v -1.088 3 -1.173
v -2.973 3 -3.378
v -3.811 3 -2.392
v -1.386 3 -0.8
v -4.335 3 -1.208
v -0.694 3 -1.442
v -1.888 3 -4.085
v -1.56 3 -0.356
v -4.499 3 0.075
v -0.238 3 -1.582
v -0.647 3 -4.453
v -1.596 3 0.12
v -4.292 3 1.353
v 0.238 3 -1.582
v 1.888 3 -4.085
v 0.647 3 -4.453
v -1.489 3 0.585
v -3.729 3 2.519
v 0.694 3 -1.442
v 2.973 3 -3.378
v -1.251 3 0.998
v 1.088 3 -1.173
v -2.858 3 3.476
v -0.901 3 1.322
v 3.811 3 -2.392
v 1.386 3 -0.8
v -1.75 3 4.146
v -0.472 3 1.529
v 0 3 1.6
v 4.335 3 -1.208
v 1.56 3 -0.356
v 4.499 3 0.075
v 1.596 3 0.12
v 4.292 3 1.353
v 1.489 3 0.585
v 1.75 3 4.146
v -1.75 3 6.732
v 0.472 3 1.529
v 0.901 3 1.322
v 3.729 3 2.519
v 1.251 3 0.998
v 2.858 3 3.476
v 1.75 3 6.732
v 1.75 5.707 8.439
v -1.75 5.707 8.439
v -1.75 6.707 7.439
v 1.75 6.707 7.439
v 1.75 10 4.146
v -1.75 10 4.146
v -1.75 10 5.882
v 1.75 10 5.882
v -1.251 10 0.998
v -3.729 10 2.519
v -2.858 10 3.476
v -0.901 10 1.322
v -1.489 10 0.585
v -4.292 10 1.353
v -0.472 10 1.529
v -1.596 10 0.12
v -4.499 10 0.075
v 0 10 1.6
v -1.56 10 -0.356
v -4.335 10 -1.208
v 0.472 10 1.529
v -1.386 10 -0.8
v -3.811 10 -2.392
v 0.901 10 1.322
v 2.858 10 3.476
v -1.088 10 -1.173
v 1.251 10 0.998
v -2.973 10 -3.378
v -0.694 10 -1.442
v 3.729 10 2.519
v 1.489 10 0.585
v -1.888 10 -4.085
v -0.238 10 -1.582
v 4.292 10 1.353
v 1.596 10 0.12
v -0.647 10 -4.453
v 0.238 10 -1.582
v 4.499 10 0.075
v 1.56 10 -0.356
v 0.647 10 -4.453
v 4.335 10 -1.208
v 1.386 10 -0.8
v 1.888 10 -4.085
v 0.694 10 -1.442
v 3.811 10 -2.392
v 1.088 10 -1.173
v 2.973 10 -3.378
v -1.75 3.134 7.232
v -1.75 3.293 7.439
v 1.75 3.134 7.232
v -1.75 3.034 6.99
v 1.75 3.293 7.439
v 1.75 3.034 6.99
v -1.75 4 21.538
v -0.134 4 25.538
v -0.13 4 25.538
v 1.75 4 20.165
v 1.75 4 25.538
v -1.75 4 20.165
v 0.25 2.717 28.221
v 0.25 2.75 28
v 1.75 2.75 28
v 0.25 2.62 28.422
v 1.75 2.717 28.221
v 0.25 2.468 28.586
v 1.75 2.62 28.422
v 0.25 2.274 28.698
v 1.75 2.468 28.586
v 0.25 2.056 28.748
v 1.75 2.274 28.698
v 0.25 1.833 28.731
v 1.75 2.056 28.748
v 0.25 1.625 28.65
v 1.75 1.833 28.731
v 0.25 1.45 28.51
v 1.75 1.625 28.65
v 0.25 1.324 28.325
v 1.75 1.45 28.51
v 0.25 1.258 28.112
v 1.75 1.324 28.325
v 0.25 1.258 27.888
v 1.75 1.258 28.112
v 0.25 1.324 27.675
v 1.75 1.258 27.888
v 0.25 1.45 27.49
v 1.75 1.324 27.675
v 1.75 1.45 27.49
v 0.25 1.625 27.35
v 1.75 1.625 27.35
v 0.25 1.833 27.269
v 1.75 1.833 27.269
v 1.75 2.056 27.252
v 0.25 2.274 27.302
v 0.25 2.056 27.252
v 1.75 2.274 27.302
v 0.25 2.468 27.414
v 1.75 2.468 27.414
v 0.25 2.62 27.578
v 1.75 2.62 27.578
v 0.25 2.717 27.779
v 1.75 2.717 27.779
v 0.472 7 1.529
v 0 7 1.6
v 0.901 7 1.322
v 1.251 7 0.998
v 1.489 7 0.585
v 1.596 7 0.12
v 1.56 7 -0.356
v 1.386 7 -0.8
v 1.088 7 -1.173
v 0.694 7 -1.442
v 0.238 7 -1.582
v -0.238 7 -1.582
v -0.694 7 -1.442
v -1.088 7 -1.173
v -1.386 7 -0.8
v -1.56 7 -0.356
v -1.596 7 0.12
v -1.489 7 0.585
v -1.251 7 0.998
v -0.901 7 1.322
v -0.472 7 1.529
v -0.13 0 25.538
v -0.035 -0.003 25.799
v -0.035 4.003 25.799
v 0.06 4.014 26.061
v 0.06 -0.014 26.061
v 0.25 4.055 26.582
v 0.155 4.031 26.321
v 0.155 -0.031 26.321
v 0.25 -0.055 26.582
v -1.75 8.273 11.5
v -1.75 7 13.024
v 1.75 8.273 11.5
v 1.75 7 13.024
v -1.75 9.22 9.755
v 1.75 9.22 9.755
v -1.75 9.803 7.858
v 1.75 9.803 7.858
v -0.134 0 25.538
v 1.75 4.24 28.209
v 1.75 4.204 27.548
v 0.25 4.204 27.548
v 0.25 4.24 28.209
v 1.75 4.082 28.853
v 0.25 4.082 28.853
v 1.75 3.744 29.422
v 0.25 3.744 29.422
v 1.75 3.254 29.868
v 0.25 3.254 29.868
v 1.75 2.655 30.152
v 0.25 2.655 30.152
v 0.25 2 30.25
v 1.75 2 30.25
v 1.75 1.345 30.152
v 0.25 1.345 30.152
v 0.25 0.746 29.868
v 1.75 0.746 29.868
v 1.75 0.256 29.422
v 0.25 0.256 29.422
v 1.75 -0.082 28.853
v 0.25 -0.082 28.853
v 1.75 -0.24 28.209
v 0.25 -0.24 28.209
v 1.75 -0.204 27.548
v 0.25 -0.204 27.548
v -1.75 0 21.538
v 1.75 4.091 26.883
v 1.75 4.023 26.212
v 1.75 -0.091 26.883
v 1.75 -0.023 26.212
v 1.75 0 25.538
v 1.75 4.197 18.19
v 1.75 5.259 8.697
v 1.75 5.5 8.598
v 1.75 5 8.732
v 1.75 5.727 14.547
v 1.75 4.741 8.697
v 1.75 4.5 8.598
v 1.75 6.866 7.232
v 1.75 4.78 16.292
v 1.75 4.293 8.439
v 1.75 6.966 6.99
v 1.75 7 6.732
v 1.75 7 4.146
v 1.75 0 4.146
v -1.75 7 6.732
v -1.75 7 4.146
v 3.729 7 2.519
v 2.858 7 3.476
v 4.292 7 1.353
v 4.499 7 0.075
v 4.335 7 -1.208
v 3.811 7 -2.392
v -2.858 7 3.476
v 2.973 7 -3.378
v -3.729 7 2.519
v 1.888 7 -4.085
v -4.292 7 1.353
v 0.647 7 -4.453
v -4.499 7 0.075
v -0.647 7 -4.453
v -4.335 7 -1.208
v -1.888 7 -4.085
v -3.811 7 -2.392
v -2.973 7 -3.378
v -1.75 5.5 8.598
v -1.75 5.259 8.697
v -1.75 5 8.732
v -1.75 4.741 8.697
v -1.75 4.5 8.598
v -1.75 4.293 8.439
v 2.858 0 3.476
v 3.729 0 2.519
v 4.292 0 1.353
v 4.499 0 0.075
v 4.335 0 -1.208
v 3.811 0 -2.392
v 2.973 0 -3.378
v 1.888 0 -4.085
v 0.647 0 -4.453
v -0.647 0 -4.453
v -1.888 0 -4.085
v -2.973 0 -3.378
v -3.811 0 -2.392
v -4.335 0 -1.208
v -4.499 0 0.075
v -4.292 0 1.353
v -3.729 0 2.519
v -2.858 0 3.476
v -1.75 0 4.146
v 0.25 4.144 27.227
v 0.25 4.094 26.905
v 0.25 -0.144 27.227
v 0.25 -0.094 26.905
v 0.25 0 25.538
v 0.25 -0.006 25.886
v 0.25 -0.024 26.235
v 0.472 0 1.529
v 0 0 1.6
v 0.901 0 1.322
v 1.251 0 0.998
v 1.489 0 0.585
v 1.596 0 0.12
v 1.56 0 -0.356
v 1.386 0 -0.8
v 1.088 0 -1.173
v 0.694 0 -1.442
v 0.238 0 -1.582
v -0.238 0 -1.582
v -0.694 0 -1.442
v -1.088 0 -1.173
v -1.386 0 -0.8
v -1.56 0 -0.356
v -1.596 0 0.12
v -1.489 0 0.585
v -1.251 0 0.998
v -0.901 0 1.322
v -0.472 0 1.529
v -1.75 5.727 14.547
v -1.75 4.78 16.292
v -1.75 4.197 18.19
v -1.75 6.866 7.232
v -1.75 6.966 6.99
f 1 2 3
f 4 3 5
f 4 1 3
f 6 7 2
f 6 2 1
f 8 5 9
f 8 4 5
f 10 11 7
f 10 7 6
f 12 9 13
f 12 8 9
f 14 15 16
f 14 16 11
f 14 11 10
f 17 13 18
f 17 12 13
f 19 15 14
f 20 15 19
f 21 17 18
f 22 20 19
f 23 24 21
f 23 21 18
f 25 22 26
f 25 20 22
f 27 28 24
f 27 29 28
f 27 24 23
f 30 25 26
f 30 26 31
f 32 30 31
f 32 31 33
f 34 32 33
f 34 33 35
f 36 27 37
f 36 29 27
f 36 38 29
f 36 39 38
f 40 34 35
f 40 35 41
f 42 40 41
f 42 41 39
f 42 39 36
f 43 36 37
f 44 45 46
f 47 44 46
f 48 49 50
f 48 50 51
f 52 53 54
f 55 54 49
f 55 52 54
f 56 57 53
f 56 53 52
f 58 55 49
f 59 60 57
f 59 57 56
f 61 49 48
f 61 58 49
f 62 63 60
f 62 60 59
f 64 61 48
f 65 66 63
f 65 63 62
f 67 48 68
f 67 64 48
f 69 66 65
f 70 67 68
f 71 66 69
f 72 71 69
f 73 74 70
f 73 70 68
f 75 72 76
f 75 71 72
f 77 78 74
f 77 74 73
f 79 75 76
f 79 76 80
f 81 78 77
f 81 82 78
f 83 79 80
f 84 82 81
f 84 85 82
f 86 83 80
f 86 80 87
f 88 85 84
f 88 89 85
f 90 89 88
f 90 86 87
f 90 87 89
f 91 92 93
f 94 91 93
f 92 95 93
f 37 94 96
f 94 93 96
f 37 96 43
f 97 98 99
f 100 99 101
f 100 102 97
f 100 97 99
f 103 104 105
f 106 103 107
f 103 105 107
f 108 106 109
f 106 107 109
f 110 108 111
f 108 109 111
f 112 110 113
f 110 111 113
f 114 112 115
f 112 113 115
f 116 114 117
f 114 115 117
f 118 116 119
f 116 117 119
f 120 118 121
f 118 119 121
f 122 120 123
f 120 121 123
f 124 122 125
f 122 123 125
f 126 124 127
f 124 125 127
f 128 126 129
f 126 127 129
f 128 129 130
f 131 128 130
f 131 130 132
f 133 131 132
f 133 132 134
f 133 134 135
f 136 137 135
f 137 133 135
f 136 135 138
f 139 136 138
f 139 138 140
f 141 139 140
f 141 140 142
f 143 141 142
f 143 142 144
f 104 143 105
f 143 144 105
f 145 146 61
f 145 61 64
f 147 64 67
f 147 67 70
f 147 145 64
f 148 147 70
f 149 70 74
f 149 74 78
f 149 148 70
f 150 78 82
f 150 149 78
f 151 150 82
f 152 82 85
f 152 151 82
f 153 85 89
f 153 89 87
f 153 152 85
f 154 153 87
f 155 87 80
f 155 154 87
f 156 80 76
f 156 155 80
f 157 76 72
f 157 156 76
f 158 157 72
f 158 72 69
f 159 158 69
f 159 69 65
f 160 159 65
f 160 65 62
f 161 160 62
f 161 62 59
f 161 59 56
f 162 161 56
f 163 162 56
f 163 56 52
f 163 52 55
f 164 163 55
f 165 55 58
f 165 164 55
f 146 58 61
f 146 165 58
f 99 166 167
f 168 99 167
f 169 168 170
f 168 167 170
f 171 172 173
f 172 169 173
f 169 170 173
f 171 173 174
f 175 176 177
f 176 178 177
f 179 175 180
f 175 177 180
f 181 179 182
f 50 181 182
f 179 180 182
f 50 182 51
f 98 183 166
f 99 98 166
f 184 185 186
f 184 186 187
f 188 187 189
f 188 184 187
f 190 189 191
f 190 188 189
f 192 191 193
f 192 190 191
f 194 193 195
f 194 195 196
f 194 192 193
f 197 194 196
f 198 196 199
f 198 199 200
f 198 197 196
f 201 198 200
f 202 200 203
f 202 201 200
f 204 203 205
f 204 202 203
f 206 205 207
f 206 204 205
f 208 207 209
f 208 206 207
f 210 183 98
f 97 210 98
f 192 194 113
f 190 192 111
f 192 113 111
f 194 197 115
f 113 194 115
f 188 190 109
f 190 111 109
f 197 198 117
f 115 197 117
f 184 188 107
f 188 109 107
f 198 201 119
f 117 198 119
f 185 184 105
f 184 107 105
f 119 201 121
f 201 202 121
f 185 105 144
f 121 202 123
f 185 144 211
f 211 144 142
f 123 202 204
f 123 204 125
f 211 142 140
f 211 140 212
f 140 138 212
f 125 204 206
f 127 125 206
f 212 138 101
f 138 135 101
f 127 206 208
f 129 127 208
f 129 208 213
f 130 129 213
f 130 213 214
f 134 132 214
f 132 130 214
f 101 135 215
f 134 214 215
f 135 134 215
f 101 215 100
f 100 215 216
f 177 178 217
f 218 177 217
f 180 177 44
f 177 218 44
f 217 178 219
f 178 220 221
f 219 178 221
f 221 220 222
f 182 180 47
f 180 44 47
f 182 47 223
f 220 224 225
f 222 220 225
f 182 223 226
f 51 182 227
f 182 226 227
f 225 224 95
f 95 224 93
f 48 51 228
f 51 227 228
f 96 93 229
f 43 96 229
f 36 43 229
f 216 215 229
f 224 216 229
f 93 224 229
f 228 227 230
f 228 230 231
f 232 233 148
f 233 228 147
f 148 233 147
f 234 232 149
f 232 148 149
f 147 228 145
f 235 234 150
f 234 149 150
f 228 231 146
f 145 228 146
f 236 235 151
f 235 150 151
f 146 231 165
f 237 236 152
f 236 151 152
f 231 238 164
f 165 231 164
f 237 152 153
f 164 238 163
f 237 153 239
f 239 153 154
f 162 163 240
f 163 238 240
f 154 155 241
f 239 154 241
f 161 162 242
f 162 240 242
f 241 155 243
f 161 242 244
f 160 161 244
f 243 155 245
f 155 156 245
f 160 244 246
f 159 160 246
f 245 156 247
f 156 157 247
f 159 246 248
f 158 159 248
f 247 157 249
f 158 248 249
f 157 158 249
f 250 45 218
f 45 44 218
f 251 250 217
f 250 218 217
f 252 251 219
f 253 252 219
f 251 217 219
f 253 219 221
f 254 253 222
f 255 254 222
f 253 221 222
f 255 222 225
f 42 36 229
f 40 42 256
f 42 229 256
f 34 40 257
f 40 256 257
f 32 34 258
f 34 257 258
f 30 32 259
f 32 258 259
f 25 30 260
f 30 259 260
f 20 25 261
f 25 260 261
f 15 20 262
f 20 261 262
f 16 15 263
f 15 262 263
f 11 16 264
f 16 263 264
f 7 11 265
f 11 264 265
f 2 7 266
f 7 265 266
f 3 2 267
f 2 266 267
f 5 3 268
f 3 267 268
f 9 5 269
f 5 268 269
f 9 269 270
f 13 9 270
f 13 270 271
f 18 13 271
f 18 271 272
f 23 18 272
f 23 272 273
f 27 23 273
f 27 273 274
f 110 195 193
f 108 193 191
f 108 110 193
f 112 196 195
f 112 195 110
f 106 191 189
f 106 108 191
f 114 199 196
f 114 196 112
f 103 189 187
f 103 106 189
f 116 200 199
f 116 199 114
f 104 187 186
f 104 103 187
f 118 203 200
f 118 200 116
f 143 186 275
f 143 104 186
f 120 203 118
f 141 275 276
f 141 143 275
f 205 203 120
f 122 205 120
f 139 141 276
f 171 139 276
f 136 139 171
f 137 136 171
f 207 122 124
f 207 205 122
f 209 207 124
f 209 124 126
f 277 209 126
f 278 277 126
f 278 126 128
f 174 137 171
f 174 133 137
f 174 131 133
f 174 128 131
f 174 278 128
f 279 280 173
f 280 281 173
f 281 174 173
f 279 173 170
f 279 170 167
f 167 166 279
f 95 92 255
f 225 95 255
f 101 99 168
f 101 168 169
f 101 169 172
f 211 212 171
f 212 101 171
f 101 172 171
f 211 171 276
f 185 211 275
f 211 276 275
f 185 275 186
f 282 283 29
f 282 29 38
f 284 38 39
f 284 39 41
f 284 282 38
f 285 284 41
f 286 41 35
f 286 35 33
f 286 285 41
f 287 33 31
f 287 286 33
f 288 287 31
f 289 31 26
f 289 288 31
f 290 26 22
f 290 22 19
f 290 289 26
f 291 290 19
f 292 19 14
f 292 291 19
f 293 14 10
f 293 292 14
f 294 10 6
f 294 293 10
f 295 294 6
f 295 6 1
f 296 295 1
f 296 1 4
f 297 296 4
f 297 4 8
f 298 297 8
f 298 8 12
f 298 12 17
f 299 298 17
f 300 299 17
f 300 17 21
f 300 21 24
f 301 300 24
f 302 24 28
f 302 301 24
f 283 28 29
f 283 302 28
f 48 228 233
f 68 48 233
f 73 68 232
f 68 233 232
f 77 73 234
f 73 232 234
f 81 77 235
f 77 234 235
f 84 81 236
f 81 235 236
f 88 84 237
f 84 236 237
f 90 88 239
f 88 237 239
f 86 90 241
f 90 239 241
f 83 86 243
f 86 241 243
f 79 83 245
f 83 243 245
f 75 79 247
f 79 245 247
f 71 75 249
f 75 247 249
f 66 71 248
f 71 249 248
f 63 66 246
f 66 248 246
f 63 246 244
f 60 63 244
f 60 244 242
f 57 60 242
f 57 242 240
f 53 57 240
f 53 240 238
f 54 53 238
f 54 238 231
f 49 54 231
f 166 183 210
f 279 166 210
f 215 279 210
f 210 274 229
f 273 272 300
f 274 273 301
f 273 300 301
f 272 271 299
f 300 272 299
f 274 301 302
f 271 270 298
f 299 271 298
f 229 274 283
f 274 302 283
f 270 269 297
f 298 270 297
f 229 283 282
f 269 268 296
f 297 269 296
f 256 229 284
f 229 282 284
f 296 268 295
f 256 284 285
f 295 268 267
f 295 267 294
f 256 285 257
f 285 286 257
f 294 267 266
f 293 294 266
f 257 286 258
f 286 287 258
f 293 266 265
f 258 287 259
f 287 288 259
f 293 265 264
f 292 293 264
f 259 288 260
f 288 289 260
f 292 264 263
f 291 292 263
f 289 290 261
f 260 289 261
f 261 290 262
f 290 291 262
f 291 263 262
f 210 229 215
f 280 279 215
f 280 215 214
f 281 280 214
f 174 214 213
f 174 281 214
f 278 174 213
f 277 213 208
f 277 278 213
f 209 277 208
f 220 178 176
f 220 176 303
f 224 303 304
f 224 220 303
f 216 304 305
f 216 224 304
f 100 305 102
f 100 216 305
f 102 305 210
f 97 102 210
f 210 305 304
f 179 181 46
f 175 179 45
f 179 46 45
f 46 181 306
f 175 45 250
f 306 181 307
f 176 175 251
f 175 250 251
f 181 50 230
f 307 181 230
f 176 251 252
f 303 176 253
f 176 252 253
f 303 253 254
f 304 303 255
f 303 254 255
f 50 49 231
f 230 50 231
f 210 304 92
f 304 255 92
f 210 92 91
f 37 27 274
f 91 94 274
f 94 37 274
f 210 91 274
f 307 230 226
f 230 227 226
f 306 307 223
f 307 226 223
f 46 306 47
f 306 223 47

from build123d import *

# Parameters (mm, degrees)
SKETCH4_R           = 4.5
SKETCH4_R_2         = 1.6
BOSS_EXTRUDE3_DEPTH = 3
BOSS_EXTRUDE4_START = 4
SKETCH5_R           = 4.5
SKETCH5_R_2         = 1.6
BOSS_EXTRUDE4_DEPTH = 3
BOSS_EXTRUDE5_START = -10
BOSS_EXTRUDE5_DEPTH = 10
CUT_EXTRUDE1_DEPTH  = 17.126453423
SKETCH8_W           = 3.5
SKETCH8_H           = 4
BOSS_EXTRUDE6_DEPTH = 17
SKETCH9_R           = 0.75
CUT_EXTRUDE2_DEPTH  = 31.381943651
SKETCH10_R          = 2.25
SKETCH10_R_2        = 0.75
BOSS_EXTRUDE7_DEPTH = 1.5
FILLET1_R           = 10
FILLET2_R           = 10
FILLET3_R           = 1
SKETCH11_W          = 2
SKETCH11_H          = 2.46221445
CUT_EXTRUDE3_DEPTH  = 33.176272314
CHAMFER2_SIZE       = 4
CHAMFER2_SIZE2      = 1.616104903
CHAMFER3_SIZE       = 0.38
CHAMFER3_SIZE_2     = 1.044041419


with BuildPart() as part:
    # Sketch4 → Boss-Extrude3 (new body)
    with BuildSketch(Plane(origin=(0, 0, 0), x_dir=(1, 0, 0), z_dir=(0, 1, 0))):
        with Locations(Location((0, 0, 0), (0, 0, 270))):
            Circle(SKETCH4_R)
        with Locations(Location((0, 0, 0), (0, 0, 270))):
            Circle(SKETCH4_R_2, mode=Mode.SUBTRACT)
    extrude(amount=BOSS_EXTRUDE3_DEPTH)



with BuildPart() as body_2:
    # Sketch5 → Boss-Extrude4 (new body)
    with BuildSketch(Plane(origin=(0, 3, 0), x_dir=(1, 0, 0), z_dir=(0, 1, 0)).offset(BOSS_EXTRUDE4_START)):
        with Locations(Location((0, 0, 0), (0, 0, 270))):
            Circle(SKETCH5_R)
        with Locations(Location((0, 0, 0), (0, 0, 270))):
            Circle(SKETCH5_R_2, mode=Mode.SUBTRACT)
    extrude(amount=BOSS_EXTRUDE4_DEPTH)


with BuildPart() as part_1:
    add(part.part)

    add(body_2.part)  # Boss-Extrude5 merges body 2
    # Sketch6 → Boss-Extrude5 (add)
    with BuildSketch(Plane(origin=(0, 10, 0), x_dir=(1, 0, 0), z_dir=(0, 1, 0)).offset(BOSS_EXTRUDE5_START)):
        with BuildLine():
            ThreePointArc((1.75, -4.145780988), (0, -4.5), (-1.75, -4.145780988))
            Line((-1.75, -4.145780988), (-1.75, -11))
            Line((-1.75, -11), (1.75, -11))
            Line((1.75, -11), (1.75, -4.145780988))
        make_face()
    extrude(amount=BOSS_EXTRUDE5_DEPTH)

    # Sketch7 → Cut-Extrude1 (cut, through all)
    with BuildSketch(Plane.ZY.offset(1.75)):
        Polygon((4.145780988, 7), (4.145780988, 3), (7.145780988, 3), (9.145780988, 5), (7.145780988, 7), align=None)
    extrude(amount=-CUT_EXTRUDE1_DEPTH, mode=Mode.SUBTRACT)

    # Sketch8 → Boss-Extrude6 (add)
    with BuildSketch(Plane.XY.offset(11)):
        with Locations((0, 2)):
            Rectangle(SKETCH8_W, SKETCH8_H)
    extrude(amount=BOSS_EXTRUDE6_DEPTH)

    # Sketch9 → Cut-Extrude2 (cut, through all)
    with BuildSketch(Plane(origin=(1.75, 0, 0), x_dir=(0, 0, -1), z_dir=(1, 0, 0))):
        with Locations((-28, 2)):
            Circle(SKETCH9_R)
    extrude(amount=-CUT_EXTRUDE2_DEPTH, mode=Mode.SUBTRACT)

    # Sketch10 → Boss-Extrude7 (add)
    with BuildSketch(Plane(origin=(1.75, 0, 0), x_dir=(0, 0, -1), z_dir=(1, 0, 0))):
        with Locations((-28, 2)):
            Circle(SKETCH10_R)
        with Locations((-28, 2)):
            Circle(SKETCH10_R_2, mode=Mode.SUBTRACT)
    extrude(amount=-BOSS_EXTRUDE7_DEPTH)

    # Fillet1
    # the kernel refuses this fillet: 10 mm, written as the material it adds along each edge
    with BuildSketch(Plane(origin=(1.75, 4, 11), x_dir=(0, 1, 0), z_dir=(-1, 0, 0))) as fillet1_piece_1:
        with BuildLine():
            CenterArc((10, -9.16515139), FILLET1_R, 113.578178478, 66.421821522)
            Line((0, -9.16515139), (0, 0))
            Line((0, 0), (6, 0))
        make_face()
    extrude(amount=3.5)
    with BuildSketch(Plane(origin=(0.25, 4, 26.969223594), x_dir=(0, 0, -1), z_dir=(1, 0, 0))) as fillet1_piece_2:
        with BuildLine():
            CenterArc((1.431438044, 10), FILLET1_R, 258.404727341, 11.595272659)
            ThreePointArc((-0.578532936, 0.204081633), (-0.282278366, 0.121850768), (0, 0))
            Line((0, 0), (1.431438044, 0))
        make_face()
    extrude(amount=1.5)
    with BuildSketch(Plane(origin=(0.25, 0, 26.969223594), x_dir=(0, -0.33266579589081224, 0.9430447859165186), z_dir=(1, 0, 0))) as fillet1_piece_3:
        with BuildLine():
            CenterArc((1.976747775, 9.906638335), FILLET1_R, 250.569341445, 11.595272659)
            Line((-1.349910184, 0.476190476), (0, 0))
            ThreePointArc((0, 0), (0.306736724, 0.021006375), (0.613473447, 0))
        make_face()
    extrude(amount=1.5)

    # Fillet2
    fillet2_edges = [part_1.edges().sort_by_distance(p)[0] for p in [
        (0, 10, 11),
    ]]
    fillet(fillet2_edges, radius=FILLET2_R)

    # Fillet3
    fillet3_edges = [part_1.edges().sort_by_distance(p)[0] for p in [
        (0, 7, 7.145780988),
        (0, 5, 9.145780988),
        (0, 3, 7.145780988),
    ]]
    fillet(fillet3_edges, radius=FILLET3_R)

    # Sketch11 → Cut-Extrude3 (cut, through all)
    with BuildSketch(Plane.XZ):
        with Locations((-0.75, 26.768892775)):
            Rectangle(SKETCH11_W, SKETCH11_H)
    extrude(amount=-CUT_EXTRUDE3_DEPTH, mode=Mode.SUBTRACT)

    # Chamfer2
    chamfer2_edges = [part_1.edges().sort_by_distance(p)[0] for p in [
        (-1.75, 2, 25.53778555),
    ]]
    chamfer2_side = [part_1.faces().sort_by_distance(p)[0] for p in [
        (-1.75, 3.550024841, 13.432455859),
    ]]
    chamfer(chamfer2_edges, length=CHAMFER2_SIZE, length2=CHAMFER2_SIZE2, reference=chamfer2_side[0])

    # Chamfer3
    # the kernel refuses this chamfer: 1.044041419, 0.38 mm, written as the material it adds along each edge
    with BuildSketch(Plane(origin=(0.25, -2.708446751, 25.53778555), x_dir=(-0.9950833631817484, 0, -0.09904090225205131), z_dir=(0, 1, 0))) as chamfer3_piece_1_section:
        Polygon((CHAMFER3_SIZE * 0.995083363182, CHAMFER3_SIZE * 0.0990409022521), (-CHAMFER3_SIZE_2 * 0.0990409022893, CHAMFER3_SIZE_2 * 0.995083363556), (0, 0), align=None)
    chamfer3_piece_1 = extrude(amount=9.416893502, mode=Mode.PRIVATE)
    chamfer3_piece_1 = chamfer3_piece_1 - Plane(origin=(0.195523629, 14, 25.53778555), x_dir=(0, 0, -1), z_dir=(-1, 0, 0)) * Cylinder(10, 23, mode=Mode.PRIVATE)
    chamfer3_piece_1 = chamfer3_piece_1 - Plane(origin=(0.195523629, -10, 25.53778555), x_dir=(0, -0.3326657958908282, 0.943044785916513), z_dir=(-1, 0, 0)) * Cylinder(10, 23, mode=Mode.PRIVATE)
    add(chamfer3_piece_1)


solid = part_1.part
